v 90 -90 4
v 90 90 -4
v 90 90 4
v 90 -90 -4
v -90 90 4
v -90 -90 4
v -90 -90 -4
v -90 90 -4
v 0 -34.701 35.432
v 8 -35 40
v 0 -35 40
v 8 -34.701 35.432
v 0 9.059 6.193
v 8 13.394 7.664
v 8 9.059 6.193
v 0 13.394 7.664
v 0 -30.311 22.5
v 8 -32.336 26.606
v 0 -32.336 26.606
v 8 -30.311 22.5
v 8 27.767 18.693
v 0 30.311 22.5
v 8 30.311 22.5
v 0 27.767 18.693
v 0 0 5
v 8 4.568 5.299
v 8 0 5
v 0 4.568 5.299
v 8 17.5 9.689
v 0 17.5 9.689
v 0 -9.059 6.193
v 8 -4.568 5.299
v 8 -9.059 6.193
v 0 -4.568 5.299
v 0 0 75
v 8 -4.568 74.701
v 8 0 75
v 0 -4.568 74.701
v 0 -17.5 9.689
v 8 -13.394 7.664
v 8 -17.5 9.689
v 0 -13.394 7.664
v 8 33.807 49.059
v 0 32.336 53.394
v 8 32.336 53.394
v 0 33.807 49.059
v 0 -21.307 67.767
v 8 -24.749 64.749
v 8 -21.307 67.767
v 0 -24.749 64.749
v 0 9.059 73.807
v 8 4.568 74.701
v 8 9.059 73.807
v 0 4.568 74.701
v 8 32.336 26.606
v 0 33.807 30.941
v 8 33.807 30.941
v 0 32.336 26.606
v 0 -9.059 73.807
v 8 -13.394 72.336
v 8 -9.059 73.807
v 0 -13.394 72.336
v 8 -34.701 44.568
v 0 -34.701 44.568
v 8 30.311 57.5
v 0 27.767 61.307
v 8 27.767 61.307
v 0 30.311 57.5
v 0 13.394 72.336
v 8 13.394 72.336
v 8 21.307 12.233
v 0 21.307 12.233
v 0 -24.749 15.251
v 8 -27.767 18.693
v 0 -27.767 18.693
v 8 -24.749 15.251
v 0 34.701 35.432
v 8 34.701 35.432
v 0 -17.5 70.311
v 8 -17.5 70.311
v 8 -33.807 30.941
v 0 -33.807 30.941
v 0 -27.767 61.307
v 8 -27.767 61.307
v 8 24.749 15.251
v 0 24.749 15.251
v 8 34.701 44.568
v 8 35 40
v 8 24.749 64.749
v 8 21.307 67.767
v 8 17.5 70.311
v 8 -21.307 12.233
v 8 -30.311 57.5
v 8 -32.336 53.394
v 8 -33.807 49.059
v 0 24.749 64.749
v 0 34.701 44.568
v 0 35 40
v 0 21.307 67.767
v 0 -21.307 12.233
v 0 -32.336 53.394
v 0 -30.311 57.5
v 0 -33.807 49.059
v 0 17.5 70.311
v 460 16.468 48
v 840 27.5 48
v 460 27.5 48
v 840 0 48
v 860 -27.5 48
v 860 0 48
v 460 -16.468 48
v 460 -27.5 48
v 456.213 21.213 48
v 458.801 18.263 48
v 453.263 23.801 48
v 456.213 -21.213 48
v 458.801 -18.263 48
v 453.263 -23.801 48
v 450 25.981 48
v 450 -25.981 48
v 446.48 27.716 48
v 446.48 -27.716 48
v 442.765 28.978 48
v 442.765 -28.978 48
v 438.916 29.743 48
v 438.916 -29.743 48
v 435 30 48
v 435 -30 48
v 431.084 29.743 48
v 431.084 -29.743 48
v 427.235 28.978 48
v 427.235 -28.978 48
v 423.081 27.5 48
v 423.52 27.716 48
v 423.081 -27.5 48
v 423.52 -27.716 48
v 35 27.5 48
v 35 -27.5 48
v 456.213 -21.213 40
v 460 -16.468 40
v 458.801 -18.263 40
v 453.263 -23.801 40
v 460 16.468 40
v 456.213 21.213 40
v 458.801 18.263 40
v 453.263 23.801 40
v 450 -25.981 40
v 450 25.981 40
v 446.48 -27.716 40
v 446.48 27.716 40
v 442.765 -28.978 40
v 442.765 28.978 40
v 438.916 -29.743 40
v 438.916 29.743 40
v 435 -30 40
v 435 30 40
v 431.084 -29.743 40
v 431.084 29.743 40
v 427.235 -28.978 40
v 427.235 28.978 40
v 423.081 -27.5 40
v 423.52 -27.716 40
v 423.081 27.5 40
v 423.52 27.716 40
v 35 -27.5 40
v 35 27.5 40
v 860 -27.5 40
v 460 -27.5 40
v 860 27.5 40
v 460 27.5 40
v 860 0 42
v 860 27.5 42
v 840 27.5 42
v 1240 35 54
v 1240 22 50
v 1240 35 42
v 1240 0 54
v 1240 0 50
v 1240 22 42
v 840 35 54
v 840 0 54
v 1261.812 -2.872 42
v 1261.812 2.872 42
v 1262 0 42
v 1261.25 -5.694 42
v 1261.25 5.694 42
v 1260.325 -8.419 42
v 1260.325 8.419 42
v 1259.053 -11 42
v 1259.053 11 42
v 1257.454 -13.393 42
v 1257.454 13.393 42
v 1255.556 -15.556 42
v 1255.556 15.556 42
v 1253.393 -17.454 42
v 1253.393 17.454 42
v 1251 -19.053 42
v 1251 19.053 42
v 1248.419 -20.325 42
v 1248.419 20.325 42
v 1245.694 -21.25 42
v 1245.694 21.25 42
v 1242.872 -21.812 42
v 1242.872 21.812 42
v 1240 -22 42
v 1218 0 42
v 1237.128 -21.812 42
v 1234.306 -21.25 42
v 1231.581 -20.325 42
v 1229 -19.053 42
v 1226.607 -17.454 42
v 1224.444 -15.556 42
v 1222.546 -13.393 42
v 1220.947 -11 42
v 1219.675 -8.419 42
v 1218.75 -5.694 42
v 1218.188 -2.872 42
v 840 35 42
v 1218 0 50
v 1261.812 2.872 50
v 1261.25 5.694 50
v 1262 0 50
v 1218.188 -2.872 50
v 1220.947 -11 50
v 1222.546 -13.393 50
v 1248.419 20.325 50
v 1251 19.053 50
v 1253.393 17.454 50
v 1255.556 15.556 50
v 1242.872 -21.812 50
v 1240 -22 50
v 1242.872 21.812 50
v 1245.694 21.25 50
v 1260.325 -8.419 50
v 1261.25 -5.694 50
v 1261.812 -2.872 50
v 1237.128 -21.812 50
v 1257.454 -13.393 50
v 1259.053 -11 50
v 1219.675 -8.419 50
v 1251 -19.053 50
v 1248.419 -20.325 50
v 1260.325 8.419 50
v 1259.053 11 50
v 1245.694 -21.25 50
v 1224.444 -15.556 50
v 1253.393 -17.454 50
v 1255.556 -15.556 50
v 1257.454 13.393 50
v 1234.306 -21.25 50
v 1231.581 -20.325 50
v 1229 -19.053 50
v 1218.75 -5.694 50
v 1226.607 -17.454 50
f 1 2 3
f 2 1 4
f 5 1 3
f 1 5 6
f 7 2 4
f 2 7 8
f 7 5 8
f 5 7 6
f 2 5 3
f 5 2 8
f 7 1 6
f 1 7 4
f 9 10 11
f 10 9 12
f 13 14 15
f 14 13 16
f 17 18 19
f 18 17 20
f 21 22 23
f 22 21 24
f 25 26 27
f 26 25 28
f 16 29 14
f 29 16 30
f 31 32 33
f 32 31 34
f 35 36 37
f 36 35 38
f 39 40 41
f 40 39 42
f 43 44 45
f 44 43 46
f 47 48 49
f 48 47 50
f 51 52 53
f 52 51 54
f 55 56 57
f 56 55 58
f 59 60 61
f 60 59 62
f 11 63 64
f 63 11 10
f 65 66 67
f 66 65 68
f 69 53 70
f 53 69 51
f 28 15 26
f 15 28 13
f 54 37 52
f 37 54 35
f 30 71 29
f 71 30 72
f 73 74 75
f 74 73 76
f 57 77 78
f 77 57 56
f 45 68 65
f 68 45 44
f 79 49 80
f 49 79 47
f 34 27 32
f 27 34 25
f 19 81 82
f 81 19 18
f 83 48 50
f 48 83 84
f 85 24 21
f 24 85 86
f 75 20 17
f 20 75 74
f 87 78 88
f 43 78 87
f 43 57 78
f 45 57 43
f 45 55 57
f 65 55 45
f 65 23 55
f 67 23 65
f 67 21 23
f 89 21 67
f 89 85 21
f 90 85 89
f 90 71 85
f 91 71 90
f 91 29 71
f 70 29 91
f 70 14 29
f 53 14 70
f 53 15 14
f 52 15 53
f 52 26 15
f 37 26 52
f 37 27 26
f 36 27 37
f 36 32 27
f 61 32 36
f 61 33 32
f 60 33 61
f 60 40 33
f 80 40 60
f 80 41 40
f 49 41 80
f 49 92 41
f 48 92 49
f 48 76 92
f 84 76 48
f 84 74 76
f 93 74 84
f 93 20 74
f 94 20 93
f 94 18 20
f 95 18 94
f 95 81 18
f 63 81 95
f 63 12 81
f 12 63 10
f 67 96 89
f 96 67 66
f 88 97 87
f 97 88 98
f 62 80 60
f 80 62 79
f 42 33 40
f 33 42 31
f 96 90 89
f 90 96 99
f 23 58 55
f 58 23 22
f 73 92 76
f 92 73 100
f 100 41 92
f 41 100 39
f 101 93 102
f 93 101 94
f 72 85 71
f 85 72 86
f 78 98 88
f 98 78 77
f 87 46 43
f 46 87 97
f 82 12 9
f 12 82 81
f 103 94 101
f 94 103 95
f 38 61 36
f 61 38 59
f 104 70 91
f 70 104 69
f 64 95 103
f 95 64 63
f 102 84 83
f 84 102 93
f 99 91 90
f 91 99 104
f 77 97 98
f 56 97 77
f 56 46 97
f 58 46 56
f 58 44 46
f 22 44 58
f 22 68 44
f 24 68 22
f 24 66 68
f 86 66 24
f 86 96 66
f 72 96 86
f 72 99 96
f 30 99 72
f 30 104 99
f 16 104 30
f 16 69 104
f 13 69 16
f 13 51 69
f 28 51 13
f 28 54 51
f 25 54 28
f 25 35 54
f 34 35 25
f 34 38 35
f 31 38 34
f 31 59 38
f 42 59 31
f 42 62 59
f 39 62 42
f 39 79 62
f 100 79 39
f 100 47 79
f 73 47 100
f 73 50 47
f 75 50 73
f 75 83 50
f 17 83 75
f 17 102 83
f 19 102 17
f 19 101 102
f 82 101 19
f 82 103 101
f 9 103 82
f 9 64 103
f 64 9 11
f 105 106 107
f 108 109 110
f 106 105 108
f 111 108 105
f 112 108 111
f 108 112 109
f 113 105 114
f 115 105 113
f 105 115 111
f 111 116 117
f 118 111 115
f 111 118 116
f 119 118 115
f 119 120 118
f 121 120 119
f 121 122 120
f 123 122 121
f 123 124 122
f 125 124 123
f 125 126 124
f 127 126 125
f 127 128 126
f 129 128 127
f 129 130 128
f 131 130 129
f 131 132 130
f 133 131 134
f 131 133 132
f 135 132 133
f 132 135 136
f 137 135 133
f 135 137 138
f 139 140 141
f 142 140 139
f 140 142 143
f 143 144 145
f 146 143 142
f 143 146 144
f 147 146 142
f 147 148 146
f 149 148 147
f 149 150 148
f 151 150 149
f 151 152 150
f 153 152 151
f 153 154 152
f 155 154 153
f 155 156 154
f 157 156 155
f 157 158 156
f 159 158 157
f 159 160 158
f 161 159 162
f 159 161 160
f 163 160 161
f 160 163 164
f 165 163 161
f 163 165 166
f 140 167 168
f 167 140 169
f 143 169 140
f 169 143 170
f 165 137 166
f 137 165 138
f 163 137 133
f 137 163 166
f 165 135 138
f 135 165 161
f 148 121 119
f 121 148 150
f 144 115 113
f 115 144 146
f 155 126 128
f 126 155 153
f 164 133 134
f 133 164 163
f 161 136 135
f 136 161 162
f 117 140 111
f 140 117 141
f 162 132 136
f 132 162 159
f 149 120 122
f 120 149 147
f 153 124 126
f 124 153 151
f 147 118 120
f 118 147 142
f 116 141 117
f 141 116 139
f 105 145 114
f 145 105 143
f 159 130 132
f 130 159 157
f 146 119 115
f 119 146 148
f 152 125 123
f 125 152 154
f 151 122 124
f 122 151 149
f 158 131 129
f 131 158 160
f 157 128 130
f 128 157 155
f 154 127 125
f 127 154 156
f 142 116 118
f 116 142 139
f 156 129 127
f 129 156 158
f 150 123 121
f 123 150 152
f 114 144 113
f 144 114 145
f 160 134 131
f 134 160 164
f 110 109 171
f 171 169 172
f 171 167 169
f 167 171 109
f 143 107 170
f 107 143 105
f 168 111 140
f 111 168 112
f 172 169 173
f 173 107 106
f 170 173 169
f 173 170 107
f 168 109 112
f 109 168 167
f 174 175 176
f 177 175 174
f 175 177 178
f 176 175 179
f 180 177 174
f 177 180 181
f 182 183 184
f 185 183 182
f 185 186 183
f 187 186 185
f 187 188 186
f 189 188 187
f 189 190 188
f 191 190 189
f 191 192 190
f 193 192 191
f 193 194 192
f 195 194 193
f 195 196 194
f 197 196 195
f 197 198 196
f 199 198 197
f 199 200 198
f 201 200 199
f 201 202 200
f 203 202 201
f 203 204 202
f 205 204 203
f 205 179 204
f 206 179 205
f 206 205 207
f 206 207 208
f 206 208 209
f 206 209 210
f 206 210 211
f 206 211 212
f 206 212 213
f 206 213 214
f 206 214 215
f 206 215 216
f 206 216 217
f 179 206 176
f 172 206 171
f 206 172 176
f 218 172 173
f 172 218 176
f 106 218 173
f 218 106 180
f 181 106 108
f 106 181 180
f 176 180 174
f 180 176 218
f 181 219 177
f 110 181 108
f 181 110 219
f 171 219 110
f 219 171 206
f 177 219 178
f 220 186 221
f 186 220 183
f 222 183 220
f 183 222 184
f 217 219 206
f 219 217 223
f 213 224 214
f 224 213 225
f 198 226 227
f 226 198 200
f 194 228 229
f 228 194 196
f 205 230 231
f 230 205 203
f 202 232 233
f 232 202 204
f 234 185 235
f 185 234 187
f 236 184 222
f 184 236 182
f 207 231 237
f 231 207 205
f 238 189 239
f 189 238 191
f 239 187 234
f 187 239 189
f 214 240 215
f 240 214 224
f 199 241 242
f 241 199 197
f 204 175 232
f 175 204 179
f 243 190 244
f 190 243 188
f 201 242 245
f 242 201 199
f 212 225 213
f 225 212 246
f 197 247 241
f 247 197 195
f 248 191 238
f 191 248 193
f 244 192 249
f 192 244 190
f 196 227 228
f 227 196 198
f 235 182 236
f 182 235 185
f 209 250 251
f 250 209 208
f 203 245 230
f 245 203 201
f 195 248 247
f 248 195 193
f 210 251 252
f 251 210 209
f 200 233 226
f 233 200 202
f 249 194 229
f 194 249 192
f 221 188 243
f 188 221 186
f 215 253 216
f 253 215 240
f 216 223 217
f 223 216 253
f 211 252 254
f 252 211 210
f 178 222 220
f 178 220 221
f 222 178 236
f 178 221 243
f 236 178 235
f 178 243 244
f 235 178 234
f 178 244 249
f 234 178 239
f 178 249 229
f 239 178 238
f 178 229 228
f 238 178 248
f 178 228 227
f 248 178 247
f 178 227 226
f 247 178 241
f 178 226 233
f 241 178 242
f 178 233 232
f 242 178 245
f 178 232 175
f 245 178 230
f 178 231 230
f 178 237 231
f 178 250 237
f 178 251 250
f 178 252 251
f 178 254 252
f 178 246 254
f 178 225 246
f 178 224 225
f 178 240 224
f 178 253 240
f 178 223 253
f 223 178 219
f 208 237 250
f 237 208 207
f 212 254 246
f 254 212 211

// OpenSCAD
// ARM01 master conceptual OpenSCAD model. Units: mm.
// Final structural, actuator, bearing and safety engineering is required before fabrication.
$fn = 48;
upper_len=400;
fore_len=400;
extension_len=400;
plate_t=8;
link_w=55;
joint_r=35;
base_w=180;
base_d=180;

module plate(len,w,t=plate_t){ translate([0,-w/2,0]) cube([len,w,t]); }
module joint(r=35,t=plate_t){ cylinder(h=t,r=r); }
module arm01(){
  cube([base_w,base_d,plate_t],center=true);
  translate([0,0,40]) rotate([0,90,0]) joint();
  translate([joint_r,0,40]) plate(upper_len,link_w);
  translate([joint_r+upper_len,0,40]) joint(30);
  translate([joint_r+upper_len+25,0,40]) plate(fore_len,link_w);
  translate([joint_r+upper_len+fore_len+5,0,42]) cube([extension_len,35,12]);
  translate([joint_r+upper_len+fore_len+extension_len+5,0,42]) joint(22);
}
arm01();

// Uncomment for a conceptual 12-module radial arrangement:
// for(i=[0:11]) rotate([0,0,i*30]) translate([250,0,0]) arm01();
